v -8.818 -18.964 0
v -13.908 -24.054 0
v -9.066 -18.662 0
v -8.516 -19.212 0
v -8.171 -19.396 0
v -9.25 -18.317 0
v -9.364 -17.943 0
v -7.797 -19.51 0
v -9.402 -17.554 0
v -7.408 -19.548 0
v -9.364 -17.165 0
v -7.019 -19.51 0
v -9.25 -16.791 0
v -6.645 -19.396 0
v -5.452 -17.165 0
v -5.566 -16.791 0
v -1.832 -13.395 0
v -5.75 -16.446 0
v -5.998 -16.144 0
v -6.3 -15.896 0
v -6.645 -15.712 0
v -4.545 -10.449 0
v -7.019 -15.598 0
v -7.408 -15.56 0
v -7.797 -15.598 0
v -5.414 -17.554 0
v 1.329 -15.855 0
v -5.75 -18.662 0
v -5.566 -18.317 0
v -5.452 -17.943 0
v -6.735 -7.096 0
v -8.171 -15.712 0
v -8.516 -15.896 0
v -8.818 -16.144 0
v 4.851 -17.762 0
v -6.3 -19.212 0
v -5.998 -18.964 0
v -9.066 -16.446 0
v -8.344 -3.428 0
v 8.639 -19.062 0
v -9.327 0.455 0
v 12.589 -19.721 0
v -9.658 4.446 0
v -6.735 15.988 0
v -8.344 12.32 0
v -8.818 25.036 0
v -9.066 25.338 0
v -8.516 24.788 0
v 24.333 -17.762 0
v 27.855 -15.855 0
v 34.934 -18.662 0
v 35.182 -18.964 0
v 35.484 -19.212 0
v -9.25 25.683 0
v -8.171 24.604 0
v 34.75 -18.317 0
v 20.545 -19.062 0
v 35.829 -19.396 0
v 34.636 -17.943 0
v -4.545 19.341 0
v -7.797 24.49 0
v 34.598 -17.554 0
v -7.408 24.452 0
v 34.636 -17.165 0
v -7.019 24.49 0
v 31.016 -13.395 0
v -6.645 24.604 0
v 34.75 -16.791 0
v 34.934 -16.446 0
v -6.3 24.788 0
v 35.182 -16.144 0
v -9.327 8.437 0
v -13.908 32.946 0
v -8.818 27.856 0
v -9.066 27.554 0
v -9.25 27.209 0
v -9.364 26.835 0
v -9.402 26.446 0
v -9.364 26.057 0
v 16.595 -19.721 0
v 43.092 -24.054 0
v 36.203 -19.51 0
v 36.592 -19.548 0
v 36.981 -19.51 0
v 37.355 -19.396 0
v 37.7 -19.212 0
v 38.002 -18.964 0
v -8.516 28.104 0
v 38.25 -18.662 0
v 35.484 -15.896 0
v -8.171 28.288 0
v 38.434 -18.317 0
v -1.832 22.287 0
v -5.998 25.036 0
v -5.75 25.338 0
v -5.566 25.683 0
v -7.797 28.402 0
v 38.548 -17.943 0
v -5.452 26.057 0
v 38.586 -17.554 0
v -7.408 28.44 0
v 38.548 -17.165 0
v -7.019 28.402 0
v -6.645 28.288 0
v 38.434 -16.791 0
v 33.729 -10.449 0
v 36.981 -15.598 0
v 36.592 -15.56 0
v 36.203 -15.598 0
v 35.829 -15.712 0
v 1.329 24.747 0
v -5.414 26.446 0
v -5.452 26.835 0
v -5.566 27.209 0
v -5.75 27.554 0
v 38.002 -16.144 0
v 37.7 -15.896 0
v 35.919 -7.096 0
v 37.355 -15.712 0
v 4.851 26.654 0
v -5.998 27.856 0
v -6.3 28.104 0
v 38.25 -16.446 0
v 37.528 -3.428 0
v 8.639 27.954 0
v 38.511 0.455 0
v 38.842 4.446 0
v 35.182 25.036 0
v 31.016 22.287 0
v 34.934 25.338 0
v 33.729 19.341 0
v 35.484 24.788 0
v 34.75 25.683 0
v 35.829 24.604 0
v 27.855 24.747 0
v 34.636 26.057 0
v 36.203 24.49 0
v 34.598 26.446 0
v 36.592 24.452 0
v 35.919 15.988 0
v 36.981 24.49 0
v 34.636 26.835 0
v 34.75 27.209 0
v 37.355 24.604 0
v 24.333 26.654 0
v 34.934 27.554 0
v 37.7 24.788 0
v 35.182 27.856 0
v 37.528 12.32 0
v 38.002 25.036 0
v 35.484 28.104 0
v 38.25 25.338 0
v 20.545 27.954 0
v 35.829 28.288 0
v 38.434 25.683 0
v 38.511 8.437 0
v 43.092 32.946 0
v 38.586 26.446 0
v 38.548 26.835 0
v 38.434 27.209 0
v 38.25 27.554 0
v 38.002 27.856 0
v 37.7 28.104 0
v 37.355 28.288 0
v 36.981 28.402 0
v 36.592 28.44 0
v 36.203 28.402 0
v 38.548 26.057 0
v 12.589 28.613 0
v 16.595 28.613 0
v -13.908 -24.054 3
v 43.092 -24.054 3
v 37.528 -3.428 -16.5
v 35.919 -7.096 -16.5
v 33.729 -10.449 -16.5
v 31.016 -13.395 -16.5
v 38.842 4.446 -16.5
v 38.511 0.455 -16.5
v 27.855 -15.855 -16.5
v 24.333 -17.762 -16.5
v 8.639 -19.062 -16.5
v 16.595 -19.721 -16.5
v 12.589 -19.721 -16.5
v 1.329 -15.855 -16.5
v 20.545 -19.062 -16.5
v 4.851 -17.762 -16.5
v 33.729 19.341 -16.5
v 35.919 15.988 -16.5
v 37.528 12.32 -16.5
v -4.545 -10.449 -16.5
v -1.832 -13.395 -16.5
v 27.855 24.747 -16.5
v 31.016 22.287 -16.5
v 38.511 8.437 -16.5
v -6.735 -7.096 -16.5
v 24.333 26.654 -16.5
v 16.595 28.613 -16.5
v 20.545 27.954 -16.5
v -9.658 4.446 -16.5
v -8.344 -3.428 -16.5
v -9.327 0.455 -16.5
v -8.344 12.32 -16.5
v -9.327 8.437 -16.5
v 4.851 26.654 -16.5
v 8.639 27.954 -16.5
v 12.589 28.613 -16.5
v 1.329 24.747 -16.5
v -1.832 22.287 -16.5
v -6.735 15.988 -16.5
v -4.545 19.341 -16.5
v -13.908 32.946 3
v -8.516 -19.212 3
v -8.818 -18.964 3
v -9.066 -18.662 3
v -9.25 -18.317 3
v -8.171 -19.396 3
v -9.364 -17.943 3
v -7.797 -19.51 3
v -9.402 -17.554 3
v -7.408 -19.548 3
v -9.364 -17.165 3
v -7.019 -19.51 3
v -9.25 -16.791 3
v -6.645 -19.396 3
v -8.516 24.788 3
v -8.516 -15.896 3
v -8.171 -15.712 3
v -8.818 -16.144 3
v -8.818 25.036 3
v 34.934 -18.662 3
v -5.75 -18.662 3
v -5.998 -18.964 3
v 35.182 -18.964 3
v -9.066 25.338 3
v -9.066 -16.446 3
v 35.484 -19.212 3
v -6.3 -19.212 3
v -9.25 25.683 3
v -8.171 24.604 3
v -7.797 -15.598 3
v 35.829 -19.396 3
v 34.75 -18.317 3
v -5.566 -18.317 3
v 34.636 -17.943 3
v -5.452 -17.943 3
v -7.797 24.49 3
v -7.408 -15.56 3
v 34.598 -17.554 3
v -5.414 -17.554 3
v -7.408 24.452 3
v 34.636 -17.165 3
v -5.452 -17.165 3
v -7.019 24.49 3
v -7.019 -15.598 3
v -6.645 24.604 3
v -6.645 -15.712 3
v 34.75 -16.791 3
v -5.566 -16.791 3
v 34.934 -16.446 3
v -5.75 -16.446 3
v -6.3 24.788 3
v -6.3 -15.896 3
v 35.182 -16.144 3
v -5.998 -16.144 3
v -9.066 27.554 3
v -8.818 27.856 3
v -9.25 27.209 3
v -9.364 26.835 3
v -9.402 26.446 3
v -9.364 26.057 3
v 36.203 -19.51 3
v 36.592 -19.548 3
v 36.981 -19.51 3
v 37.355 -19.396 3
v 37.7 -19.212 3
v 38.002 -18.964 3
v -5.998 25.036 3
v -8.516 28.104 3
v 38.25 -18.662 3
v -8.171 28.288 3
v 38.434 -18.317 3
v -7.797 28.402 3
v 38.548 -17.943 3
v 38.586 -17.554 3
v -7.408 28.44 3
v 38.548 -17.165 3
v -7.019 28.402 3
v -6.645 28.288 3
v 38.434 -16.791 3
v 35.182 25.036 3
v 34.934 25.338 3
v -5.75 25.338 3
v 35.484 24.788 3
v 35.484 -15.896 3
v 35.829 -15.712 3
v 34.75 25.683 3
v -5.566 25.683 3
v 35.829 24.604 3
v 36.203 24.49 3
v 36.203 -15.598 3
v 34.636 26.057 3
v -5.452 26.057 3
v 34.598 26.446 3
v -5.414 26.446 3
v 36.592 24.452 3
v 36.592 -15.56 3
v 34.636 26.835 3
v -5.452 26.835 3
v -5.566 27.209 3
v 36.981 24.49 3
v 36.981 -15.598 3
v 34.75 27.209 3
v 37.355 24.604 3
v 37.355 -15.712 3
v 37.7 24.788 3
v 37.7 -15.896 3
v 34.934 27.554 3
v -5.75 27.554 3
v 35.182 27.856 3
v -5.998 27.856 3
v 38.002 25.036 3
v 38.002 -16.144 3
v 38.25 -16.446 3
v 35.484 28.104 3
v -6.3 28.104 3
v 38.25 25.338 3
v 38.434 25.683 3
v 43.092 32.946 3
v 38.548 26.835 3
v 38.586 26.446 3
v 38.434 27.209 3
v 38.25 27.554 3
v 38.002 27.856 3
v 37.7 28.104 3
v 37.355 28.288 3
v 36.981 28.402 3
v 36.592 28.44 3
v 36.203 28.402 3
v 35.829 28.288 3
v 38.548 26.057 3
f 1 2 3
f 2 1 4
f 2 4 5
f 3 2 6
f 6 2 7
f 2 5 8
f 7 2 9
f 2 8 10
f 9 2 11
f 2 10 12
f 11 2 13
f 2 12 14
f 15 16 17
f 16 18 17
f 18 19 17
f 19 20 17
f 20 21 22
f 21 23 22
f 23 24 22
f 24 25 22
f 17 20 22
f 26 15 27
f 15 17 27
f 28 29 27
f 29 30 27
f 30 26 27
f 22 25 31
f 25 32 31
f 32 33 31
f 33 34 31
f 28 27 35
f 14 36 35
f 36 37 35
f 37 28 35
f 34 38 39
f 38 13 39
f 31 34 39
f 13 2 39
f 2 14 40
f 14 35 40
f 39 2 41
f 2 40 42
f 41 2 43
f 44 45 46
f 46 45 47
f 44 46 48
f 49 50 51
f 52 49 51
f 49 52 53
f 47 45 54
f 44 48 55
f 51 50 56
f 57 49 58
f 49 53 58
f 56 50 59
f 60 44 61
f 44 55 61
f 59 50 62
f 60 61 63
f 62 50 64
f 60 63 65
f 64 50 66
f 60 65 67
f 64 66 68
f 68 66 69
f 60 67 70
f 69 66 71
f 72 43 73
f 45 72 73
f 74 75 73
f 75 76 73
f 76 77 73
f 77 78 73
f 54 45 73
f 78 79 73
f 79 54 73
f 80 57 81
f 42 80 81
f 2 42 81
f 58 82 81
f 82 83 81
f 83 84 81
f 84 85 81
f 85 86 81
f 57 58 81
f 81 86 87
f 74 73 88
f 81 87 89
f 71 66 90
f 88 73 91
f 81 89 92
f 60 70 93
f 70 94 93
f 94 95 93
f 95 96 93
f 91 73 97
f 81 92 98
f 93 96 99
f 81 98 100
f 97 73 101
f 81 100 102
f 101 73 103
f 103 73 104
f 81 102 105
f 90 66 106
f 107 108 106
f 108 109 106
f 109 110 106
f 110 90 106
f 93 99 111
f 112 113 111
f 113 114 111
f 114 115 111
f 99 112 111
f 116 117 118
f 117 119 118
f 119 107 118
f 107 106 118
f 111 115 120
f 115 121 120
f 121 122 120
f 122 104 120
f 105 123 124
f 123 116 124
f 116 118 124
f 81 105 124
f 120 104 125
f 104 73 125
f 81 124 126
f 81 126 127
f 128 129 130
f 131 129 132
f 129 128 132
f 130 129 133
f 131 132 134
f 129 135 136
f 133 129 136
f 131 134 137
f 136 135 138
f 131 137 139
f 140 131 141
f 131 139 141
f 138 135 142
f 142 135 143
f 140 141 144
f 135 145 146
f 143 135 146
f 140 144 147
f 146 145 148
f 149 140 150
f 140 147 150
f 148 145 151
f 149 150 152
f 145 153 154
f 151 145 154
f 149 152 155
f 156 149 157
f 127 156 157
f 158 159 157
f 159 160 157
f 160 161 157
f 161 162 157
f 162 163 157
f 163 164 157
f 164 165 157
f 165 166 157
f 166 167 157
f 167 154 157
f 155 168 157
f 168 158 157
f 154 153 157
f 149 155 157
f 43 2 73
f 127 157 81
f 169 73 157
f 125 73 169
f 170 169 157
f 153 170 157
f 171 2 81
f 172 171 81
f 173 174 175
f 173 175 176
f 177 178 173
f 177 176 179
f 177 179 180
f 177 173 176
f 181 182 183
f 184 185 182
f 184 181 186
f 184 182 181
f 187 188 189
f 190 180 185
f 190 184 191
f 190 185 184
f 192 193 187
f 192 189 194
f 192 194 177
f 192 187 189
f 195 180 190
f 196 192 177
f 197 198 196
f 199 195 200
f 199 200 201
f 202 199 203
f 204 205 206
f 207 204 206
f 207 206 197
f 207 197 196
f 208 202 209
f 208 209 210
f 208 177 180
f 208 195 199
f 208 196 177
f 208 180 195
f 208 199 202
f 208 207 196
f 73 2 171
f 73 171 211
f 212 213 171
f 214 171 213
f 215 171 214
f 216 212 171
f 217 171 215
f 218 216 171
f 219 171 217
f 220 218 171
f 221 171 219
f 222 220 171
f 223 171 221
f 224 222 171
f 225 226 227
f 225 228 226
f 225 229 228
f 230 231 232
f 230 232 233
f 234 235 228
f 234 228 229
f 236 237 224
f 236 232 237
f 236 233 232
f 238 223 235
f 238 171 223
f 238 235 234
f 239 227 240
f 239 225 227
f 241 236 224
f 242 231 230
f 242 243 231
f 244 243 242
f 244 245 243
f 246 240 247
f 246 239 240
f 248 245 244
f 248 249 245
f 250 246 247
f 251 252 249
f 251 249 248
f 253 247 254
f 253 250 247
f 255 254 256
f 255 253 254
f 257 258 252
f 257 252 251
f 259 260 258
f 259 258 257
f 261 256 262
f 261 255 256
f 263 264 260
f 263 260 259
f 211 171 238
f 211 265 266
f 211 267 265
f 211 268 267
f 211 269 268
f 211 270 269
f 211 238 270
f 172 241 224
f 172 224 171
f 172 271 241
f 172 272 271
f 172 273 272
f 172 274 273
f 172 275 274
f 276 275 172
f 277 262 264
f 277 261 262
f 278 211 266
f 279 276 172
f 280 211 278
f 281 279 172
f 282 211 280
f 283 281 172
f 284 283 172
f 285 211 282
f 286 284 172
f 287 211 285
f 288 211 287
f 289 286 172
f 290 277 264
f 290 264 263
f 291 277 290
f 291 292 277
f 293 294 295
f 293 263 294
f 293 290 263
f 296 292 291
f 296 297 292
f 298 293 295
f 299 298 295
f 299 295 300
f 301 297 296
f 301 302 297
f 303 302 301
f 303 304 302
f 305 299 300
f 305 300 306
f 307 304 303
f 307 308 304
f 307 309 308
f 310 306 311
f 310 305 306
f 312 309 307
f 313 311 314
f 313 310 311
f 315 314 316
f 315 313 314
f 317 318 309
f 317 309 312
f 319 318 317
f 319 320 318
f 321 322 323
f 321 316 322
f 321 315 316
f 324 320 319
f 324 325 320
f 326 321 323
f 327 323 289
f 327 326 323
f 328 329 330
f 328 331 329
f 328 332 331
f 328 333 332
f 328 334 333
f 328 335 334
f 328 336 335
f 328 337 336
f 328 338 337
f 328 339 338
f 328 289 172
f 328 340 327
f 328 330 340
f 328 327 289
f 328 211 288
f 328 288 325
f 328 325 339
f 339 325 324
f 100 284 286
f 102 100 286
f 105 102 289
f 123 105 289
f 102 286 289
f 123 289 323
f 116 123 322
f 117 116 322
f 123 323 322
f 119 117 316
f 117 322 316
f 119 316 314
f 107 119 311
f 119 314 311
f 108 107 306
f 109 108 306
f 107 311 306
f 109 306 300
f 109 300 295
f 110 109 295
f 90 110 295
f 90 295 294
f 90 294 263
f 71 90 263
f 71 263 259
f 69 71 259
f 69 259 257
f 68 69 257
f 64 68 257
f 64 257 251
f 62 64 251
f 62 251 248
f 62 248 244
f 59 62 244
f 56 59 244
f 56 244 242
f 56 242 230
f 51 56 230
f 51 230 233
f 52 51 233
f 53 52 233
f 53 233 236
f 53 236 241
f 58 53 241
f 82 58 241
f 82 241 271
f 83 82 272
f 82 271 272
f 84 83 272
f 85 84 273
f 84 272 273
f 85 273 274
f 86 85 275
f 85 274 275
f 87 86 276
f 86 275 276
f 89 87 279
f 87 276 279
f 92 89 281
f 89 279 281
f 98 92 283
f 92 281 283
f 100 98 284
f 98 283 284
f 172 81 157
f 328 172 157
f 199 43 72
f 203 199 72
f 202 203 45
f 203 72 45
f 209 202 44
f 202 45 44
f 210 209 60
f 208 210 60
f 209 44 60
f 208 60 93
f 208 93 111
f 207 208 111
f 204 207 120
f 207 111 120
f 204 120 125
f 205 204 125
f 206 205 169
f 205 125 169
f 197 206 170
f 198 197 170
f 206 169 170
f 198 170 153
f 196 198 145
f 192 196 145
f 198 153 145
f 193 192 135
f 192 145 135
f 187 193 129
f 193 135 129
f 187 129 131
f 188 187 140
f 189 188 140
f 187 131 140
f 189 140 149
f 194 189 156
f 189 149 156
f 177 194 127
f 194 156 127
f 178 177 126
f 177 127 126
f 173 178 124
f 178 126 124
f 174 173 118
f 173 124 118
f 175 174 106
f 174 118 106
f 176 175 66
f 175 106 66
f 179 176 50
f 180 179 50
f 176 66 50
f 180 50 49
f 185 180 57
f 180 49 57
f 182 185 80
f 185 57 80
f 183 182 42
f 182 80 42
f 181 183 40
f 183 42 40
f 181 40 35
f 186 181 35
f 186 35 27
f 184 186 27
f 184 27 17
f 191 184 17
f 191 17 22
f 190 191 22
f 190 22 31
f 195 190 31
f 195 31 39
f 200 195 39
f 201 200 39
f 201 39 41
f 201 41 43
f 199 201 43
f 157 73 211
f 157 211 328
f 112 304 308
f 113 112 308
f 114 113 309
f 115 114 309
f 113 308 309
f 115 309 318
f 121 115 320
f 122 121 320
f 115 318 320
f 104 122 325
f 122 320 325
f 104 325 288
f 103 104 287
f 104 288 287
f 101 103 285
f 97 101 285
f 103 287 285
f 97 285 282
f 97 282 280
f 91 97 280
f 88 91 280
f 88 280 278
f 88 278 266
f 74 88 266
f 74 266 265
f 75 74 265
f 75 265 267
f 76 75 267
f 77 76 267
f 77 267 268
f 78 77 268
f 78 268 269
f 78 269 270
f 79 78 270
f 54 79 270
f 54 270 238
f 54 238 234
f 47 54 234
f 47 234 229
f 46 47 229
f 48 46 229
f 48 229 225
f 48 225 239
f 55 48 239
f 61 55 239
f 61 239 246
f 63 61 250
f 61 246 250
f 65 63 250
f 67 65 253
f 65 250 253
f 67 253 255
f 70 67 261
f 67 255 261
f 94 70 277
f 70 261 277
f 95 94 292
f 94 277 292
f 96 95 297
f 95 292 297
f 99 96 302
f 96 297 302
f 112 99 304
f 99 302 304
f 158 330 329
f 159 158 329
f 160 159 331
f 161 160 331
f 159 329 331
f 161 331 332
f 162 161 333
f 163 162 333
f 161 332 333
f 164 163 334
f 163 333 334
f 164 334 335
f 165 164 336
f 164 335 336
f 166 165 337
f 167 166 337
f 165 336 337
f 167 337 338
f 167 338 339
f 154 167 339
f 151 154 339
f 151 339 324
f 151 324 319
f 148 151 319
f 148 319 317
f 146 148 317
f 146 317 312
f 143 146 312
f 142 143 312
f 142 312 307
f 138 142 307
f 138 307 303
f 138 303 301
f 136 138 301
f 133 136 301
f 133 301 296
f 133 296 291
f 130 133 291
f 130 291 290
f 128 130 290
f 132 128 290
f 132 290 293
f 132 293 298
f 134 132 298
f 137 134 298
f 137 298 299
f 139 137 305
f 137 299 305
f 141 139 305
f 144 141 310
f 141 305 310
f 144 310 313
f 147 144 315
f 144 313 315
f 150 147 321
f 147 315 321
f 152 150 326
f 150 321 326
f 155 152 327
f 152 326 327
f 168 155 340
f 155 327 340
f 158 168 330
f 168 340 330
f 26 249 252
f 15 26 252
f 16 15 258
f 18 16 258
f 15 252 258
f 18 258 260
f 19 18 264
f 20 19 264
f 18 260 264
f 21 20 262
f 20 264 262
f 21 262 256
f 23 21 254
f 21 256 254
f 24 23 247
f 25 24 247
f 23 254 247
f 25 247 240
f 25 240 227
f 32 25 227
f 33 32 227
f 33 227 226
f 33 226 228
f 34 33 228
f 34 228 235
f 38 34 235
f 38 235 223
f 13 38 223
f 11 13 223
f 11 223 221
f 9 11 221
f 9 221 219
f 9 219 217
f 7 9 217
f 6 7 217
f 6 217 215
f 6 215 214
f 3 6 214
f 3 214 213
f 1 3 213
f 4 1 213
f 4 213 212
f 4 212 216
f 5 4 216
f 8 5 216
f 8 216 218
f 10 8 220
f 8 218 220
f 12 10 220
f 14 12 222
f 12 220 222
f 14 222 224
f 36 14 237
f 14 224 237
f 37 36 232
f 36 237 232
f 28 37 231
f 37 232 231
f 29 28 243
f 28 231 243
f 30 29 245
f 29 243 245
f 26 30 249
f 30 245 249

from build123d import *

# Parameters (mm, degrees)
SKETCH2_W           = 57
SKETCH2_H           = 57
BOSS_EXTRUDE1_DEPTH = 3
SKETCH3_R           = 24.25
BOSS_EXTRUDE2_DEPTH = 16.5
SKETCH4_R           = 1.9939
CUT_EXTRUDE1_DEPTH  = 16.5


with BuildPart() as part:
    # Sketch2 → Boss-Extrude1 (new body)
    with BuildSketch(Plane.XY):
        with Locations((14.592, 4.446)):
            Rectangle(SKETCH2_W, SKETCH2_H)
    extrude(amount=BOSS_EXTRUDE1_DEPTH)

    # Sketch3 → Boss-Extrude2 (add)
    with BuildSketch(Plane(origin=(0, 0, 0), x_dir=(-1, 0, 0), z_dir=(0, 0, -1))):
        with Locations((-14.592, 4.446)):
            Circle(SKETCH3_R)
    extrude(amount=BOSS_EXTRUDE2_DEPTH)

    # Sketch4 → Cut-Extrude1 (cut)
    with BuildSketch(Plane.XY.offset(3)):
        with Locations((36.592, 26.446)):
            Circle(SKETCH4_R)
        with Locations((36.592, -17.554)):
            Circle(SKETCH4_R)
        with Locations((-7.408, -17.554)):
            Circle(SKETCH4_R)
        with Locations((-7.408, 26.446)):
            Circle(SKETCH4_R)
    extrude(amount=-CUT_EXTRUDE1_DEPTH, mode=Mode.SUBTRACT)


solid = part.part
